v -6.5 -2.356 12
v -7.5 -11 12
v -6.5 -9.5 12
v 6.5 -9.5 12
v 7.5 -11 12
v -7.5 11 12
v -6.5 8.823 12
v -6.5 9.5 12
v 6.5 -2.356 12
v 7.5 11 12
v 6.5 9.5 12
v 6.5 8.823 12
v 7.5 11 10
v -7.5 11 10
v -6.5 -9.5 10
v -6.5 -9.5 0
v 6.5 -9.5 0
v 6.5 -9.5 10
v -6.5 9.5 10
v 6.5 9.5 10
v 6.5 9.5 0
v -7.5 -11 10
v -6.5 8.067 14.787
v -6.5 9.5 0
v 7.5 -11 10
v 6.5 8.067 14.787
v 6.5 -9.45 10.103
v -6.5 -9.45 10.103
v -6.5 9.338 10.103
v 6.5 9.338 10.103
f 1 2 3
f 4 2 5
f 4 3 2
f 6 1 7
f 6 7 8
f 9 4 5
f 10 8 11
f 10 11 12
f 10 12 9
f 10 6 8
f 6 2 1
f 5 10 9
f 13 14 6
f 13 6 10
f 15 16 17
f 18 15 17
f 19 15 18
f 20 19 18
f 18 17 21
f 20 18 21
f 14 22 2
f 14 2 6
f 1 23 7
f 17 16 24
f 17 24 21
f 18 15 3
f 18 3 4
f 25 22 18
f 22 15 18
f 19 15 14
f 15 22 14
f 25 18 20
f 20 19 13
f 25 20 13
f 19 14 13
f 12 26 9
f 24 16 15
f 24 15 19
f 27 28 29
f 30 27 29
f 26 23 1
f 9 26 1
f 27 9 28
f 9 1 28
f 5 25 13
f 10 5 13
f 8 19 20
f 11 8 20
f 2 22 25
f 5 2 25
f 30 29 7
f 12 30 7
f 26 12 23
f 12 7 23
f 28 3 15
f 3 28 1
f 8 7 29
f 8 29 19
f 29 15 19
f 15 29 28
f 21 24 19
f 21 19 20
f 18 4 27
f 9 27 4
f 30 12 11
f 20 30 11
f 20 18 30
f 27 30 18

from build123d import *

# Parameters (mm, degrees)
SKETCH1_W            = 13
SKETCH1_H            = 19
BOSS_EXTRUDE1_DEPTH  = 10
SKETCH2_W            = 15
SKETCH2_H            = 22
SKETCH2_W_2          = 13
SKETCH2_H_2          = 19
BOSS_EXTRUDE2_DEPTH  = 2
BOSS_EXTRUDE11_DEPTH = 13


with BuildPart() as part:
    # Sketch1 → Boss-Extrude1 (new body)
    with BuildSketch(Plane.XY):
        Rectangle(SKETCH1_W, SKETCH1_H)
    extrude(amount=BOSS_EXTRUDE1_DEPTH)


with BuildPart() as body_2:
    # Sketch2 → Boss-Extrude2 (new body)
    with BuildSketch(Plane.XY.offset(10)):
        Rectangle(SKETCH2_W, SKETCH2_H)
        Rectangle(SKETCH2_W_2, SKETCH2_H_2, mode=Mode.SUBTRACT)
    extrude(amount=BOSS_EXTRUDE2_DEPTH)

    # Sketch3 → Boss-Extrude11 (add)
    with BuildSketch(Plane(origin=(-6.5, 0, 0), x_dir=(0, 0, -1), z_dir=(1, 0, 0))):
        Polygon((-10.102824212, 9.337921341), (-14.787277325, 8.067403047), (-10.102824212, -9.450012288), align=None)
    extrude(amount=BOSS_EXTRUDE11_DEPTH)


solid = Compound([part.part, body_2.part])
